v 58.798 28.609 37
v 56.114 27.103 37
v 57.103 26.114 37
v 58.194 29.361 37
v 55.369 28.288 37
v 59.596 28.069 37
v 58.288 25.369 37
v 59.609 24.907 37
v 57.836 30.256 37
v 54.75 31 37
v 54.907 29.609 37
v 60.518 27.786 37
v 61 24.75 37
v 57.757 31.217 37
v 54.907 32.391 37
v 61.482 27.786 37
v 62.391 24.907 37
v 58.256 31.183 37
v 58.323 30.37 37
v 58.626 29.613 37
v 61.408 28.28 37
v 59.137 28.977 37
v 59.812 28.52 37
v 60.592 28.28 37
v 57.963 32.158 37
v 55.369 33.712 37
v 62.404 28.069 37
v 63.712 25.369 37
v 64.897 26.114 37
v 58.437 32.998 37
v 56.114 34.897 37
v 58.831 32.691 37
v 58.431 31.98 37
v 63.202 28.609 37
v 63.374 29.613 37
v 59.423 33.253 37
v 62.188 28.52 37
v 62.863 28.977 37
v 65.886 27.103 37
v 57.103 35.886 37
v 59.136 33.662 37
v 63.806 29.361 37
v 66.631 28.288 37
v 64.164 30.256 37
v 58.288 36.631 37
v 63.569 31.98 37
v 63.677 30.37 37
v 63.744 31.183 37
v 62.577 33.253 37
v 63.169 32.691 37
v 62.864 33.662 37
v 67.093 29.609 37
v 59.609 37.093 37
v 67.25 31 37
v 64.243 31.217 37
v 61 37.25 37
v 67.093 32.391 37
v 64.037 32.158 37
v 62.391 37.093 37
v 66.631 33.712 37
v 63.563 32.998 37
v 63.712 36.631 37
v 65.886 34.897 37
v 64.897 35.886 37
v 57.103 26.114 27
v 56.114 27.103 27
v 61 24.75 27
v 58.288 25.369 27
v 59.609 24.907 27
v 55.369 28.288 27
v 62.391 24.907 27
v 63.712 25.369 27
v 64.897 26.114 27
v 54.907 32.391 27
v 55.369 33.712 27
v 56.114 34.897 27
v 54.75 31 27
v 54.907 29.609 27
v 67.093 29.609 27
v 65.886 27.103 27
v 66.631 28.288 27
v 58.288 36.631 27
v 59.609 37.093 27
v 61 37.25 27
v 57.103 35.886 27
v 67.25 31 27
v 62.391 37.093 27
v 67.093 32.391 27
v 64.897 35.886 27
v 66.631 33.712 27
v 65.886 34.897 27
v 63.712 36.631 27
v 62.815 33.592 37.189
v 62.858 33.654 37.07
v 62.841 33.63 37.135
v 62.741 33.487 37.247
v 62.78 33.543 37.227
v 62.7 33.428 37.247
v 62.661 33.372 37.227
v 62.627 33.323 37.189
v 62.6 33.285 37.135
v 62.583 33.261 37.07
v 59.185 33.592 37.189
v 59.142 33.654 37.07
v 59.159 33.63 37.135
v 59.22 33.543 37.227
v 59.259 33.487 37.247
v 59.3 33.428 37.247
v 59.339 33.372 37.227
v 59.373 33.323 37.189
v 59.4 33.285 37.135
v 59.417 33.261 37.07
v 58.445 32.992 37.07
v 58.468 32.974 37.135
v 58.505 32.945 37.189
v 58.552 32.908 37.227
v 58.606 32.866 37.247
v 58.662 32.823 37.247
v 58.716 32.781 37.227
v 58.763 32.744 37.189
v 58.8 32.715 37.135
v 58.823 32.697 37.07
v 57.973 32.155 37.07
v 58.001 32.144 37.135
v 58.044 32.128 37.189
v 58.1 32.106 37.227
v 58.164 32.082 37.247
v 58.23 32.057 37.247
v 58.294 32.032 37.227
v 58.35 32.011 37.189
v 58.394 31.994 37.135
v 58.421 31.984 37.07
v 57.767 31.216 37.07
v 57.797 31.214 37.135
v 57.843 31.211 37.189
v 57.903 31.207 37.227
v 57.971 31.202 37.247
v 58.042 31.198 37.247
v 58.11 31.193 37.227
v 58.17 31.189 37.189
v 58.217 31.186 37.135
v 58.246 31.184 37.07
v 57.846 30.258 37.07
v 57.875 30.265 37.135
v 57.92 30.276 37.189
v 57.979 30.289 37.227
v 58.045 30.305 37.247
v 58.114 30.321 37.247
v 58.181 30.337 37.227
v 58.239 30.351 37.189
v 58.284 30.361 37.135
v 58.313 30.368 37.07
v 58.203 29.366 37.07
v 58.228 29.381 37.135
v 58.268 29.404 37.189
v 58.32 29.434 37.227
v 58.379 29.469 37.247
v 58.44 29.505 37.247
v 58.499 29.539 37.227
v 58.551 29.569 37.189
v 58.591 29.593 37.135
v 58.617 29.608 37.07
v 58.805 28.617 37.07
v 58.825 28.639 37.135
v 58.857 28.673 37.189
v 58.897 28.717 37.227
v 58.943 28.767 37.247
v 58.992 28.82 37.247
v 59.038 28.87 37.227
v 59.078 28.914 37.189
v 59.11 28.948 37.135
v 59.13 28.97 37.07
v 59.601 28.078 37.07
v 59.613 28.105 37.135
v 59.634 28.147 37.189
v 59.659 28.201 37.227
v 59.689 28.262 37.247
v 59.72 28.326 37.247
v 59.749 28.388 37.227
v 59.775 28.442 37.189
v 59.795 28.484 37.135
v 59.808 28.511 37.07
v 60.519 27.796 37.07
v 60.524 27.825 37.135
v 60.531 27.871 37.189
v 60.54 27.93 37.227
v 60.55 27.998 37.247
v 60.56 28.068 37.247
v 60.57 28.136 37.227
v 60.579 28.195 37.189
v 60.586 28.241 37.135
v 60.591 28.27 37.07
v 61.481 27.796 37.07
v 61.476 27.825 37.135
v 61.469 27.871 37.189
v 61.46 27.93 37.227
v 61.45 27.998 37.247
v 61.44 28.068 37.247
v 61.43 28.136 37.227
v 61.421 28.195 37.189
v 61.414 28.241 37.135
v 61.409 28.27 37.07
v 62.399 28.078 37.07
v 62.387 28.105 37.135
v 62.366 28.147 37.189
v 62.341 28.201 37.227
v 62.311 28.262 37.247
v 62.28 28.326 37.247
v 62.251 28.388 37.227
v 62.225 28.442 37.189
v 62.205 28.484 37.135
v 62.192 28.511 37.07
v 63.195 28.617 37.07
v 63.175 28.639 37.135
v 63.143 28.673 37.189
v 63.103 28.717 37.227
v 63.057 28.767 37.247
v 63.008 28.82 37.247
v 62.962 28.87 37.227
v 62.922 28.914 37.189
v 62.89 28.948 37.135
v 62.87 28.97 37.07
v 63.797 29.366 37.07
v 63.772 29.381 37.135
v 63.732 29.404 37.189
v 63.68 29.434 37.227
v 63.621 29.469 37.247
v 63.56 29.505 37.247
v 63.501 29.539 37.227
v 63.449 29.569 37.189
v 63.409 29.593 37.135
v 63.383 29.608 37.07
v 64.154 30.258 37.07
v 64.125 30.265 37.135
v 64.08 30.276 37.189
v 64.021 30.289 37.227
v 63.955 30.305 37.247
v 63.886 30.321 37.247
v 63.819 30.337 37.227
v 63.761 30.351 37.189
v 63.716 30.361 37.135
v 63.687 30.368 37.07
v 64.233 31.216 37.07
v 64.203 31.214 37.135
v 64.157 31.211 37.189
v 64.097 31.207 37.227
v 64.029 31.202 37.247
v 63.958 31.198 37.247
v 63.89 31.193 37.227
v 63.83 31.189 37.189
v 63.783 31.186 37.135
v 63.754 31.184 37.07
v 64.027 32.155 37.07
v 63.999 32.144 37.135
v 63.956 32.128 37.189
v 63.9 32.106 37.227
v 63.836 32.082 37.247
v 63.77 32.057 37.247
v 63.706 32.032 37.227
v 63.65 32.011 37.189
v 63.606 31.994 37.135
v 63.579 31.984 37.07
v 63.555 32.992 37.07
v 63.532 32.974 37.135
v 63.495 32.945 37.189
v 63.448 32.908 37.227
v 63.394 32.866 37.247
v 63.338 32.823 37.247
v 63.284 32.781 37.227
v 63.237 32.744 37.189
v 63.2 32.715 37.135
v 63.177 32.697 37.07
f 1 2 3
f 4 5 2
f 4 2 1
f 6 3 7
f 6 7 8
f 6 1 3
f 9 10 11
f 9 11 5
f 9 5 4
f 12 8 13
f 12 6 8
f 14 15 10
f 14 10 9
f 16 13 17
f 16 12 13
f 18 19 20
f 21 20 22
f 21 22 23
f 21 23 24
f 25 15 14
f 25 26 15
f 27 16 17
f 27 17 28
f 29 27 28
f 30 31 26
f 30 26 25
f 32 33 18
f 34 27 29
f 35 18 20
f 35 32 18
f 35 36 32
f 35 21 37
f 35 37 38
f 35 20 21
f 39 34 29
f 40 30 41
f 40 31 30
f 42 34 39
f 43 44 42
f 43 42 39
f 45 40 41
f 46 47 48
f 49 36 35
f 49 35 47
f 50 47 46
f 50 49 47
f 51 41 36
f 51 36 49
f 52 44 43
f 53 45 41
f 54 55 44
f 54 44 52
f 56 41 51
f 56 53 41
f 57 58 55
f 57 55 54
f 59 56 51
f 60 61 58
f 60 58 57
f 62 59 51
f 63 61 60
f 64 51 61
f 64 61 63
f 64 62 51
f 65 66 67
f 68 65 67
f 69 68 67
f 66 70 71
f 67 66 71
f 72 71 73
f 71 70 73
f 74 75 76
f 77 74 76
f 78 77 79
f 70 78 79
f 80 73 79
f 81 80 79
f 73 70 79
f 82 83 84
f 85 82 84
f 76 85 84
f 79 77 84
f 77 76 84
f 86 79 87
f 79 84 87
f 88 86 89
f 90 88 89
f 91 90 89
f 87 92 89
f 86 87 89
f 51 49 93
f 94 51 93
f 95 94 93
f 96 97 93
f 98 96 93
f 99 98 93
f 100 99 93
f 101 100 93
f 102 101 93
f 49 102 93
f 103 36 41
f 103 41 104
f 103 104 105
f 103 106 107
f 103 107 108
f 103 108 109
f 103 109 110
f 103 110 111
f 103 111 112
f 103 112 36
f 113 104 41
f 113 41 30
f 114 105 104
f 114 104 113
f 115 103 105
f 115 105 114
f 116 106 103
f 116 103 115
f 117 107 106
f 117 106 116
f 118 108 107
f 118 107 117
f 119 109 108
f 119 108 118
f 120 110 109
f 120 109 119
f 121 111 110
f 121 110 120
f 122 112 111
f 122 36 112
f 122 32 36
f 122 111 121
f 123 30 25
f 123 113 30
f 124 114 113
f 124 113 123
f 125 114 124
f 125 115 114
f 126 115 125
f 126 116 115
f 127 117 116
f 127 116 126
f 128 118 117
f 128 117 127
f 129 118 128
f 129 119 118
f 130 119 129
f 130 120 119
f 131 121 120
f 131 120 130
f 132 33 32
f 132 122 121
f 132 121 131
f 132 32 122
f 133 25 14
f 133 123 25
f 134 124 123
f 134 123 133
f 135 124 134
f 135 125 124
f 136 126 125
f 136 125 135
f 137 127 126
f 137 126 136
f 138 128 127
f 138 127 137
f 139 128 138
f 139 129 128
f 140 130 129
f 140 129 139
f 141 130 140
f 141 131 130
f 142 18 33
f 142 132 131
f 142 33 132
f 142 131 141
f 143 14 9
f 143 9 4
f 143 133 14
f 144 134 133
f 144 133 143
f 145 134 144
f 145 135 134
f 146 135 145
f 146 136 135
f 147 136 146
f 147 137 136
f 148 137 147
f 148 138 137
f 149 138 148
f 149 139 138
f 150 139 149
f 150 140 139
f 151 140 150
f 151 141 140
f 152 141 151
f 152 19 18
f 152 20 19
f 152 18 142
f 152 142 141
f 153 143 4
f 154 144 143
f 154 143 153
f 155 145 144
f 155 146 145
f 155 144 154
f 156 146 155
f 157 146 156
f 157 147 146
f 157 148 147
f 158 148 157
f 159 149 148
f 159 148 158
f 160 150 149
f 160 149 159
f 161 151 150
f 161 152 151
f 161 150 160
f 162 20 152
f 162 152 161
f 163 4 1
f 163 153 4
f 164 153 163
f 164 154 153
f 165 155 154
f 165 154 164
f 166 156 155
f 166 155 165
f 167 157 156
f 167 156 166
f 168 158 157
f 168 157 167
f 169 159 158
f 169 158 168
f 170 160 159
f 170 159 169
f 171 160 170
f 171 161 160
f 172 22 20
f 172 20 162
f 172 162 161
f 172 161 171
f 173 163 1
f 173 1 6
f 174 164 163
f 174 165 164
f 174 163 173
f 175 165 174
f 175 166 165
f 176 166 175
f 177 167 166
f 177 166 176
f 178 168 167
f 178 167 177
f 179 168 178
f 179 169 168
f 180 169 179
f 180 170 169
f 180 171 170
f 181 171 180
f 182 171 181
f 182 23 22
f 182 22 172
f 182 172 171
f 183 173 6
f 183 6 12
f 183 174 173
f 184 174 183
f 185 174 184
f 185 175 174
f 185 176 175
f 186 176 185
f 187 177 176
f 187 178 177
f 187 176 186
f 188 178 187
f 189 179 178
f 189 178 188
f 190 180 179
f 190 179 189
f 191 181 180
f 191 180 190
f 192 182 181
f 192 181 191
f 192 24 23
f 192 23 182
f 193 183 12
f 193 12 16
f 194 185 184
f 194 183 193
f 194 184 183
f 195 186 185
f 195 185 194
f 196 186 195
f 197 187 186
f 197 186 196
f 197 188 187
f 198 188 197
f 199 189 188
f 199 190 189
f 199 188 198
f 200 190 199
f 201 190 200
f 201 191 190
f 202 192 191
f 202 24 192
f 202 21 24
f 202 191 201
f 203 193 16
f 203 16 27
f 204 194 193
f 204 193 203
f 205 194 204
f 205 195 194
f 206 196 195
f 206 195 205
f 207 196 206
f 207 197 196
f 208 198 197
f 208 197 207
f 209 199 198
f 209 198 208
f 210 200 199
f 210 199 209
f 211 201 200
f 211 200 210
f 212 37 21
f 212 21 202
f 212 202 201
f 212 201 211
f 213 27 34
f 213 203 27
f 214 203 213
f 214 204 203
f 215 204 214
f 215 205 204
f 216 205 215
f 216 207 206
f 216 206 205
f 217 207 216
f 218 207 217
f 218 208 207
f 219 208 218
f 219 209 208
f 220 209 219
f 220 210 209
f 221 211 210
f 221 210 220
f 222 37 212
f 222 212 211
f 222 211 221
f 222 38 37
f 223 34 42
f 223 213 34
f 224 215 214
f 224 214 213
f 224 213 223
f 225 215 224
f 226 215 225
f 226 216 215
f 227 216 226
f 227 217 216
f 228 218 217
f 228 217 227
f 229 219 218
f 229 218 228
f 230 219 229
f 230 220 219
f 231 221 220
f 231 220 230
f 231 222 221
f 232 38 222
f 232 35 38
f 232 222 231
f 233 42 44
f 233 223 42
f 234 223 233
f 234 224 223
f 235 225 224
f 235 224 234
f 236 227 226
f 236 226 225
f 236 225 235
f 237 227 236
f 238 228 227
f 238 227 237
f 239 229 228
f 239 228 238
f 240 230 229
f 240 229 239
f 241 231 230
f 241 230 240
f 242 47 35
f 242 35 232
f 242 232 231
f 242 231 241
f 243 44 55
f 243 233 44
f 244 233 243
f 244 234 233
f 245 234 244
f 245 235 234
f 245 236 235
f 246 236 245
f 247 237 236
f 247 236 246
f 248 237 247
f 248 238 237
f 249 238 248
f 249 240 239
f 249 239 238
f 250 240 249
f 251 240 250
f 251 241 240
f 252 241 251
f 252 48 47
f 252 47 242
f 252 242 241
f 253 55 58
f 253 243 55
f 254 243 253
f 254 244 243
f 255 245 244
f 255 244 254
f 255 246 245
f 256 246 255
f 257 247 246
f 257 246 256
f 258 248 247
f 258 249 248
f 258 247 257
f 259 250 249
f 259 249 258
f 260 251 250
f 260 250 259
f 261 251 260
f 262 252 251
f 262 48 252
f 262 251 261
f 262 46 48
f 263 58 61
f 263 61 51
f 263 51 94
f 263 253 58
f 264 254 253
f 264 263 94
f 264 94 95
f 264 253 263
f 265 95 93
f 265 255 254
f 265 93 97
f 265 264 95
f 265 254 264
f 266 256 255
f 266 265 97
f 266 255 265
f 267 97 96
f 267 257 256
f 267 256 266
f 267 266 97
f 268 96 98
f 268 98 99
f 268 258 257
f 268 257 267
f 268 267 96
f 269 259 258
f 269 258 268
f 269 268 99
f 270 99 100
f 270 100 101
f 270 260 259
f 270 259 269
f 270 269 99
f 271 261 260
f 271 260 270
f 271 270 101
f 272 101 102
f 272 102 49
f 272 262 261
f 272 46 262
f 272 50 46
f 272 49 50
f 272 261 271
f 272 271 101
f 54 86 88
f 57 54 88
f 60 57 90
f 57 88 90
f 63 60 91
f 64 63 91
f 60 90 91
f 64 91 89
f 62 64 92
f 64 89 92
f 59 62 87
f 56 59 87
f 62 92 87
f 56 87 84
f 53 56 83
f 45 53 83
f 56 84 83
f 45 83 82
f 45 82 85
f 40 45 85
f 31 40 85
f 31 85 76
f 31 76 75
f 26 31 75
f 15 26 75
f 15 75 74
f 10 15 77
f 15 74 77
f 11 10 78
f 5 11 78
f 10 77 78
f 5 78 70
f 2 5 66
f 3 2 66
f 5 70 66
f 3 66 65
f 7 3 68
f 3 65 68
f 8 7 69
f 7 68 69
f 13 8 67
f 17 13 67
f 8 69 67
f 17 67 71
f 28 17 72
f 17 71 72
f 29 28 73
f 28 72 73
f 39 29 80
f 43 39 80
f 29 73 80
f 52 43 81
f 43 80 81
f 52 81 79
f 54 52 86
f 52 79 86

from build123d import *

# Parameters (mm, degrees)
CYLINDER005_R         = 6.25
CYLINDER005_DEPTH     = 10
TORUS_R               = 0.25
TORUS_ANGLE           = 290
TORUS_PLACEMENT_ANGLE = 125


with BuildPart() as power_butt:
    # Cylinder005 → Cylinder005 (new body)
    with BuildSketch(Plane(origin=(61, 31, 27), x_dir=(1, 0, 0), z_dir=(0, 0, 1))):
        Circle(CYLINDER005_R)
    extrude(amount=CYLINDER005_DEPTH)


with BuildPart() as power_button:
    # Torus → Torus (revolve)
    with BuildSketch(Plane.XZ):
        with Locations((3, 0)):
            Circle(TORUS_R)
    revolve(axis=Axis((0, 0, 0), (0, 0, 1)), revolution_arc=TORUS_ANGLE)


with BuildPart() as power_button_1:
    # Torus placement: moved
    add(power_button.part.moved(Location((61, 31, 37))).rotate(Axis((61, 31, 37), (0, 0, 1)), TORUS_PLACEMENT_ANGLE))

    # Fusion006: union power_butt
    add(power_butt.part)


solid = power_button_1.part
